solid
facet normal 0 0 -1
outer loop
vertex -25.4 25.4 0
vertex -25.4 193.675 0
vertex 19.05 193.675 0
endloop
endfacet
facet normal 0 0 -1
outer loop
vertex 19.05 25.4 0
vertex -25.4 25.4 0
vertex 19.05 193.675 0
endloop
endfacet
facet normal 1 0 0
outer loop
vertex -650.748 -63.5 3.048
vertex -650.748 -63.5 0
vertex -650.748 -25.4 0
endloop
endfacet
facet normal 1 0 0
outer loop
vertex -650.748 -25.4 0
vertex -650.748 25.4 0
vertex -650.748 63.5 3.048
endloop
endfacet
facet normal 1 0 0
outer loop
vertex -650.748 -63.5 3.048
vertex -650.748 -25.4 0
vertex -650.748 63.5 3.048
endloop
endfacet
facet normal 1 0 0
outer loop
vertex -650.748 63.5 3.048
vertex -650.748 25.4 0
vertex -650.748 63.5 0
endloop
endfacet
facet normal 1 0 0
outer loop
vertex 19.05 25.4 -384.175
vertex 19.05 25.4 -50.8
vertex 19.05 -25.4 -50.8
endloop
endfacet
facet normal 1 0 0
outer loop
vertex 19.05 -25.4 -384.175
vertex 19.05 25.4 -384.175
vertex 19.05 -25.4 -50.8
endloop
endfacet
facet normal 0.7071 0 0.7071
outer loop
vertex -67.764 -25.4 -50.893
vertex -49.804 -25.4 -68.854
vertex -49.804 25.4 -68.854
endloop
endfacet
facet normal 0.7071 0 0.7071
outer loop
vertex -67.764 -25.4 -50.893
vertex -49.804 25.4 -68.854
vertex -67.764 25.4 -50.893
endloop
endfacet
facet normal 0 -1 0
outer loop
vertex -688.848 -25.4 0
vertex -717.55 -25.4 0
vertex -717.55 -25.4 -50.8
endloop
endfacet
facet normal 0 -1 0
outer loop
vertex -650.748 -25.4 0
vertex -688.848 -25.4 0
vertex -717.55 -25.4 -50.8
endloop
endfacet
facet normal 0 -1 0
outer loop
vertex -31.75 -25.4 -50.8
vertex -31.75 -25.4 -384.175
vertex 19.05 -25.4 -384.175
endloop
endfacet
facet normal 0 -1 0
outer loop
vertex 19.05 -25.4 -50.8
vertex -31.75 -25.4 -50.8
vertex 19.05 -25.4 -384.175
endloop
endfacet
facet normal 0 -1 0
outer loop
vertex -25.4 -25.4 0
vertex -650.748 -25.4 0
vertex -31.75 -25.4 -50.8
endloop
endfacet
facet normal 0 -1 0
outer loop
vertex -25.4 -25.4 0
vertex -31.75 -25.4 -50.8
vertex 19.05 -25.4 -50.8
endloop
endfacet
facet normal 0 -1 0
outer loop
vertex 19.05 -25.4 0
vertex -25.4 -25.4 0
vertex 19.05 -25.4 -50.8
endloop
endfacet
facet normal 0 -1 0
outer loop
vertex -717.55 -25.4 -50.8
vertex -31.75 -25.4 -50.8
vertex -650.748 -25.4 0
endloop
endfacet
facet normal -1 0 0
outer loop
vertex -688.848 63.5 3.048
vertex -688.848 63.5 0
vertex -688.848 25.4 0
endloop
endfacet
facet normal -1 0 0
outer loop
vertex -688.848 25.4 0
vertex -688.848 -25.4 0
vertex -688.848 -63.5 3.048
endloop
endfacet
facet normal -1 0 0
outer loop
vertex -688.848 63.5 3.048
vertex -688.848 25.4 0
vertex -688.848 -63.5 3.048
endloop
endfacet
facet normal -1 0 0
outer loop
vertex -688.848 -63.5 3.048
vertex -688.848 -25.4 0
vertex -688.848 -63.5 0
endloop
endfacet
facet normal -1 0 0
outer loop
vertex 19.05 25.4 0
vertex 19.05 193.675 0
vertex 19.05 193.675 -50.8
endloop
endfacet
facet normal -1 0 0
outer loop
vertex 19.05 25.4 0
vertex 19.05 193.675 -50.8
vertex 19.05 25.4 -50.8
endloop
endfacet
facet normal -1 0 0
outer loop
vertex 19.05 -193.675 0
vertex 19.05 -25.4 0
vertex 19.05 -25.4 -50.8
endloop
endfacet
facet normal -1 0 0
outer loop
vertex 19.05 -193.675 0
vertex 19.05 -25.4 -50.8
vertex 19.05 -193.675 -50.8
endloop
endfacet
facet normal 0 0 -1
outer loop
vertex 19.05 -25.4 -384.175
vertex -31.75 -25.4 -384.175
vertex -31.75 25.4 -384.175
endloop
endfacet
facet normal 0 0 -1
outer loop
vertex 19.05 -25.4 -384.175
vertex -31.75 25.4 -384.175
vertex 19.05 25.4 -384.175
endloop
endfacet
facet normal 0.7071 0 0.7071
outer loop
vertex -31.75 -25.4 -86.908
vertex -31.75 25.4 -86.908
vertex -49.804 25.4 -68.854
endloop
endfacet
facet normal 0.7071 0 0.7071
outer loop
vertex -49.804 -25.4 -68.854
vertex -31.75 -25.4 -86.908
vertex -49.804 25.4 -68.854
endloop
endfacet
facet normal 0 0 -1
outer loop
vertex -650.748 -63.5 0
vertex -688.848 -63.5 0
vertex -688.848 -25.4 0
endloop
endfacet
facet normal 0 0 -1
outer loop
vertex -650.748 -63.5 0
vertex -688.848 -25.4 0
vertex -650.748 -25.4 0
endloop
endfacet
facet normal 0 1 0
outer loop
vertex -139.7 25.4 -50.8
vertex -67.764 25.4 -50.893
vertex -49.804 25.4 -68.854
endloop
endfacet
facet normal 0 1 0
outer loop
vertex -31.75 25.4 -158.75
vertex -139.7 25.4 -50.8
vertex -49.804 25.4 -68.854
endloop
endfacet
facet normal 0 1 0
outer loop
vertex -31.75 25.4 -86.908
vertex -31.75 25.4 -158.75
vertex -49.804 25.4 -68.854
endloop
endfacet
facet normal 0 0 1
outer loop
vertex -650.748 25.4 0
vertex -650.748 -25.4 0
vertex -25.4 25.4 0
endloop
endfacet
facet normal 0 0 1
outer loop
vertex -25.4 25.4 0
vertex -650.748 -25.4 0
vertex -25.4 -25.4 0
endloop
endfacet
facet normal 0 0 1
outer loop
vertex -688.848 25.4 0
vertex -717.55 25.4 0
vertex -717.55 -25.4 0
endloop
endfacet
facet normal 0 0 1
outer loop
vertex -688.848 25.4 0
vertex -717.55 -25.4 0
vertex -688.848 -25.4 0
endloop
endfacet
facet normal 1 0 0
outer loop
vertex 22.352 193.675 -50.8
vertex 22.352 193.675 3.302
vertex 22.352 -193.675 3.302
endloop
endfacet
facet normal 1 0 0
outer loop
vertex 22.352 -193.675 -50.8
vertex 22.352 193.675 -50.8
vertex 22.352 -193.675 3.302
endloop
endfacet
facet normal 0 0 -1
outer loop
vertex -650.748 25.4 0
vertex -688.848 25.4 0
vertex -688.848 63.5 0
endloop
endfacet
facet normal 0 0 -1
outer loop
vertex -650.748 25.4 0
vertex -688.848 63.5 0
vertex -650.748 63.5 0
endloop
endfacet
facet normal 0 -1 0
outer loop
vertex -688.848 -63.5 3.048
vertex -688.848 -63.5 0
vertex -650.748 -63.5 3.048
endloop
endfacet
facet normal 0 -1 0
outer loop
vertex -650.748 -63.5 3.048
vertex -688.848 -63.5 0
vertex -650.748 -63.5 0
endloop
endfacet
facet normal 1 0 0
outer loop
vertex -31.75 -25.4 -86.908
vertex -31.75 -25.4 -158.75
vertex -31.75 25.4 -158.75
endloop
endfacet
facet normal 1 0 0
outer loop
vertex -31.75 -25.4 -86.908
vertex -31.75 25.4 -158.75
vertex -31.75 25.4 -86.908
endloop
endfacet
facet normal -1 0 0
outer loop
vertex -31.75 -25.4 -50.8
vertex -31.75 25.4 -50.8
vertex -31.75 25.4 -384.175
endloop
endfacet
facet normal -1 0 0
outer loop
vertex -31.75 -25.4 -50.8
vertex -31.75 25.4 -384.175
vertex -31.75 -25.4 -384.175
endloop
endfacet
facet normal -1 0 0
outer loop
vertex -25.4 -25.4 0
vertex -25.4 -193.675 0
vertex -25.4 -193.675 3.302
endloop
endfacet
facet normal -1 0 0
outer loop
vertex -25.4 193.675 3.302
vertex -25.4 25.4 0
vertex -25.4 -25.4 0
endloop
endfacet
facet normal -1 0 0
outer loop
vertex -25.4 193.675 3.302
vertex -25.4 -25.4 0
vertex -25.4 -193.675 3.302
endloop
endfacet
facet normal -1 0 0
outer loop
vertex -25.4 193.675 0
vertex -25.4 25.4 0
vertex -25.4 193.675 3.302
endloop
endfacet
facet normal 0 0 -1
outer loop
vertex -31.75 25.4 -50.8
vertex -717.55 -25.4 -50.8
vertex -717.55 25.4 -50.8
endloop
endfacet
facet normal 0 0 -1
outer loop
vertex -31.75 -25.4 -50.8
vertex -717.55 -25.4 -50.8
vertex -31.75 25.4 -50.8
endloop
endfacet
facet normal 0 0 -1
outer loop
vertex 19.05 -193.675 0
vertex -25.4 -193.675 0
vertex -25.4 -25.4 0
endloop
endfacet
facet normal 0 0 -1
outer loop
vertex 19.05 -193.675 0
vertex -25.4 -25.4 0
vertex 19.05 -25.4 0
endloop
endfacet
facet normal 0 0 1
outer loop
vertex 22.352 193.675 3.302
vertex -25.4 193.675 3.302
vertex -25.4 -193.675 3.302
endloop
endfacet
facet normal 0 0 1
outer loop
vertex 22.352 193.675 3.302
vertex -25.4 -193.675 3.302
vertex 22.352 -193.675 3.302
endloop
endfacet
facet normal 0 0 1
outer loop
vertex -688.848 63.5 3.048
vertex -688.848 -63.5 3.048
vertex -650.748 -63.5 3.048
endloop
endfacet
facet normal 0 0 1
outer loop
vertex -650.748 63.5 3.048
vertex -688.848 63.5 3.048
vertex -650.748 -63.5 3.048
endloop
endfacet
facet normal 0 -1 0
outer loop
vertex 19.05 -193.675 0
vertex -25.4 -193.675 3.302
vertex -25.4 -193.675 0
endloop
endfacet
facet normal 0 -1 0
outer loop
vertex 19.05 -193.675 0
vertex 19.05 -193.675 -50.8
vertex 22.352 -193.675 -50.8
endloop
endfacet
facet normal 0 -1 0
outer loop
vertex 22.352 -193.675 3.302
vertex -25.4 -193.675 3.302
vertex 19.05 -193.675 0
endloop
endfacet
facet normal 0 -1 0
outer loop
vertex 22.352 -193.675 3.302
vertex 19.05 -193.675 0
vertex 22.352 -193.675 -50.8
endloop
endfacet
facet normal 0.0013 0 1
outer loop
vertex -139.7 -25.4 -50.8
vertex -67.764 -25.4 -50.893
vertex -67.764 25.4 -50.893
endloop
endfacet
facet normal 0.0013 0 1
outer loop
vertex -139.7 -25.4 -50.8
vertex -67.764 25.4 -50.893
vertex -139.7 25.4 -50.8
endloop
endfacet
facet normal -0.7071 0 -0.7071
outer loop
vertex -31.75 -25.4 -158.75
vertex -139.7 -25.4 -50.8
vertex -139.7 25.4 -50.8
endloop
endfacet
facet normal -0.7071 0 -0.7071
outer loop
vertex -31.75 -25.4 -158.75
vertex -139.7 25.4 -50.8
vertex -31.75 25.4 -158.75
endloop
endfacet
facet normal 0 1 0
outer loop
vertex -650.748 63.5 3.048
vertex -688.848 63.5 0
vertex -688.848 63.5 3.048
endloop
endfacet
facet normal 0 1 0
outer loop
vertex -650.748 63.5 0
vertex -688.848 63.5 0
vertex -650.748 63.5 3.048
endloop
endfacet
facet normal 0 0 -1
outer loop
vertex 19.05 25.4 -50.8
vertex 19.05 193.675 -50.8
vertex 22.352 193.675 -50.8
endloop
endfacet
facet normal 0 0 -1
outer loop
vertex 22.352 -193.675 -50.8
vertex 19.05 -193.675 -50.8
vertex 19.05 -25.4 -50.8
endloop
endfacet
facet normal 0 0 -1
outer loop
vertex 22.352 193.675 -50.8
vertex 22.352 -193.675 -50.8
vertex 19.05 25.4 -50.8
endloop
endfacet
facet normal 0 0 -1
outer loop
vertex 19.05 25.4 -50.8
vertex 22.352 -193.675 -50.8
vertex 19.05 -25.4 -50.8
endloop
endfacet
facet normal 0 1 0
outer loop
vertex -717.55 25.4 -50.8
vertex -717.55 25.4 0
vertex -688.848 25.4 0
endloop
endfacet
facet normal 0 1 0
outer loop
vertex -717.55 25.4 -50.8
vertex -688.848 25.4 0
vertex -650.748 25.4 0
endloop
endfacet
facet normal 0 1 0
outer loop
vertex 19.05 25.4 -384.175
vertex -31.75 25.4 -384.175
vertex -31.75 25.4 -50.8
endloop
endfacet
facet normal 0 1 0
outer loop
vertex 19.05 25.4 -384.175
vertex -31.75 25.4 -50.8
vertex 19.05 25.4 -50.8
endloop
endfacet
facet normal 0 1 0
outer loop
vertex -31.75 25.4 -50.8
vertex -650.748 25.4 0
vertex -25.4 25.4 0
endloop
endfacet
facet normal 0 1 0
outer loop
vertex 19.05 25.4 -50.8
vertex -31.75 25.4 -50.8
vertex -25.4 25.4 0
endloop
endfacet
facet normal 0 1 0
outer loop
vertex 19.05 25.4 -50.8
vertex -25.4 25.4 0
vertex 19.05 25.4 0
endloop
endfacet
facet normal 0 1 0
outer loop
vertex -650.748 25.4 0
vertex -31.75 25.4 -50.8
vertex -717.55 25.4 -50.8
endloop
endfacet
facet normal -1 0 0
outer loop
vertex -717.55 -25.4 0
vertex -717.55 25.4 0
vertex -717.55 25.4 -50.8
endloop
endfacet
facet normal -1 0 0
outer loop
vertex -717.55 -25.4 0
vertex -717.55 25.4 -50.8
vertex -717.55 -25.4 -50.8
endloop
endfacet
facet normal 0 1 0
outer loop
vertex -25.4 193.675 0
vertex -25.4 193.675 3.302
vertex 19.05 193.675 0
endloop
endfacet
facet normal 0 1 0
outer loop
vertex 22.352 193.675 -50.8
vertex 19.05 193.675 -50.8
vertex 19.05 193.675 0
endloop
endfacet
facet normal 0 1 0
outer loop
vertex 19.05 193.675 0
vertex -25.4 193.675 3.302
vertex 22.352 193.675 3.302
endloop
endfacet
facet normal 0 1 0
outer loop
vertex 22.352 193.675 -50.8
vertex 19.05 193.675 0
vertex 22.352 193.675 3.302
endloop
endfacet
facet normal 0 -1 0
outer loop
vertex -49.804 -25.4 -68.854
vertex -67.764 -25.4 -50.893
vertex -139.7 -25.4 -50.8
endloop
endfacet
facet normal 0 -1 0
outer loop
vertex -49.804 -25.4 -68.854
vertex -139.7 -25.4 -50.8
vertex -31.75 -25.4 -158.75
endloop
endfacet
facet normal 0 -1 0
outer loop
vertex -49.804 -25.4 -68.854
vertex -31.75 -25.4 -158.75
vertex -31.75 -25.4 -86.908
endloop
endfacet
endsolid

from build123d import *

# Parameters (mm, degrees)
F0_W      = 50.8
F0_H      = 387.35
F1_DEPTH  = 6.35
F2_W      = 6.35
F2_H      = 387.35
F3_DEPTH  = 50.8
F4_DEPTH  = 3.048
F5_DEPTH  = 3.048
F6_W      = 692.15
F6_H      = 50.8
F7_DEPTH  = 50.8
F8_W      = 38.1
F8_H      = 50.8
F8_H_2    = 38.1
F9_DEPTH  = 3.048
F10_W     = 50.8
F10_H     = 50.8
F11_DEPTH = 333.375
F13_DEPTH = 50.8


# Not quite as in the source:
# - a feature names something its author has since deleted; it is built from what else it names


with BuildPart() as f1:
    # F0 (on Top) → F1 (new body)
    with BuildSketch(Plane.XY):
        Rectangle(F0_W, F0_H)
    extrude(amount=F1_DEPTH)

    # F2 (on face) → F3 (join)
    with BuildSketch(Plane(origin=(0, 0, 0), x_dir=(1, 0, 0), z_dir=(0, 0, -1))):
        with Locations((22.225, 0)):
            Rectangle(F2_W, F2_H)
    extrude(amount=F3_DEPTH)

    # F4 (cut): a face of the model
    f4_faces = [f1.faces().sort_by_distance(p)[0] for p in [
        (25.4, 0, -22.225),
    ]]
    extrude(f4_faces, amount=-F4_DEPTH, mode=Mode.SUBTRACT)

    # F5 (cut): a face of the model
    f5_faces = [f1.faces().sort_by_distance(p)[0] for p in [
        (-1.524, 0, 6.35),
    ]]
    extrude(f5_faces, amount=-F5_DEPTH, mode=Mode.SUBTRACT)

    # F6 (on face) → F7 (join)
    with BuildSketch(Plane(origin=(0, 0, 0), x_dir=(1, 0, 0), z_dir=(0, 0, -1))):
        Polygon((19.05, -25.4), (19.05, 0), (19.05, 25.4), (-25.4, 25.4), (-25.4, -25.4), align=None)
        with Locations((-371.475, 0)):
            Rectangle(F6_W, F6_H)
    extrude(amount=F7_DEPTH)

    # F8 (on face) → F9 (join)
    with BuildSketch(Plane.XY):
        with Locations((-669.798, 0)):
            Rectangle(F8_W, F8_H)
        with Locations((-669.798, 44.45)):
            Rectangle(F8_W, F8_H_2)
        with Locations((-669.798, -44.45)):
            Rectangle(F8_W, F8_H_2)
    extrude(amount=F9_DEPTH)

    # F10 (on face) → F11 (join)
    with BuildSketch(Plane(origin=(0, 0, -50.8), x_dir=(1, 0, 0), z_dir=(0, 0, -1))):
        with Locations((-6.35, 0)):
            Rectangle(F10_W, F10_H)
    extrude(amount=F11_DEPTH)


with BuildPart() as f13:
    # F12 (on face) → F13 (new body)
    with BuildSketch(Plane.XZ.offset(25.4)):
        Polygon((-67.7644877579, -50.8934632736), (-139.7, -50.8), (-31.75, -158.75), (-31.75, -86.9079510314), (-49.8039755157, -68.8539755157), align=None)
    extrude(amount=-F13_DEPTH)


solid = Compound([f1.part, f13.part])
